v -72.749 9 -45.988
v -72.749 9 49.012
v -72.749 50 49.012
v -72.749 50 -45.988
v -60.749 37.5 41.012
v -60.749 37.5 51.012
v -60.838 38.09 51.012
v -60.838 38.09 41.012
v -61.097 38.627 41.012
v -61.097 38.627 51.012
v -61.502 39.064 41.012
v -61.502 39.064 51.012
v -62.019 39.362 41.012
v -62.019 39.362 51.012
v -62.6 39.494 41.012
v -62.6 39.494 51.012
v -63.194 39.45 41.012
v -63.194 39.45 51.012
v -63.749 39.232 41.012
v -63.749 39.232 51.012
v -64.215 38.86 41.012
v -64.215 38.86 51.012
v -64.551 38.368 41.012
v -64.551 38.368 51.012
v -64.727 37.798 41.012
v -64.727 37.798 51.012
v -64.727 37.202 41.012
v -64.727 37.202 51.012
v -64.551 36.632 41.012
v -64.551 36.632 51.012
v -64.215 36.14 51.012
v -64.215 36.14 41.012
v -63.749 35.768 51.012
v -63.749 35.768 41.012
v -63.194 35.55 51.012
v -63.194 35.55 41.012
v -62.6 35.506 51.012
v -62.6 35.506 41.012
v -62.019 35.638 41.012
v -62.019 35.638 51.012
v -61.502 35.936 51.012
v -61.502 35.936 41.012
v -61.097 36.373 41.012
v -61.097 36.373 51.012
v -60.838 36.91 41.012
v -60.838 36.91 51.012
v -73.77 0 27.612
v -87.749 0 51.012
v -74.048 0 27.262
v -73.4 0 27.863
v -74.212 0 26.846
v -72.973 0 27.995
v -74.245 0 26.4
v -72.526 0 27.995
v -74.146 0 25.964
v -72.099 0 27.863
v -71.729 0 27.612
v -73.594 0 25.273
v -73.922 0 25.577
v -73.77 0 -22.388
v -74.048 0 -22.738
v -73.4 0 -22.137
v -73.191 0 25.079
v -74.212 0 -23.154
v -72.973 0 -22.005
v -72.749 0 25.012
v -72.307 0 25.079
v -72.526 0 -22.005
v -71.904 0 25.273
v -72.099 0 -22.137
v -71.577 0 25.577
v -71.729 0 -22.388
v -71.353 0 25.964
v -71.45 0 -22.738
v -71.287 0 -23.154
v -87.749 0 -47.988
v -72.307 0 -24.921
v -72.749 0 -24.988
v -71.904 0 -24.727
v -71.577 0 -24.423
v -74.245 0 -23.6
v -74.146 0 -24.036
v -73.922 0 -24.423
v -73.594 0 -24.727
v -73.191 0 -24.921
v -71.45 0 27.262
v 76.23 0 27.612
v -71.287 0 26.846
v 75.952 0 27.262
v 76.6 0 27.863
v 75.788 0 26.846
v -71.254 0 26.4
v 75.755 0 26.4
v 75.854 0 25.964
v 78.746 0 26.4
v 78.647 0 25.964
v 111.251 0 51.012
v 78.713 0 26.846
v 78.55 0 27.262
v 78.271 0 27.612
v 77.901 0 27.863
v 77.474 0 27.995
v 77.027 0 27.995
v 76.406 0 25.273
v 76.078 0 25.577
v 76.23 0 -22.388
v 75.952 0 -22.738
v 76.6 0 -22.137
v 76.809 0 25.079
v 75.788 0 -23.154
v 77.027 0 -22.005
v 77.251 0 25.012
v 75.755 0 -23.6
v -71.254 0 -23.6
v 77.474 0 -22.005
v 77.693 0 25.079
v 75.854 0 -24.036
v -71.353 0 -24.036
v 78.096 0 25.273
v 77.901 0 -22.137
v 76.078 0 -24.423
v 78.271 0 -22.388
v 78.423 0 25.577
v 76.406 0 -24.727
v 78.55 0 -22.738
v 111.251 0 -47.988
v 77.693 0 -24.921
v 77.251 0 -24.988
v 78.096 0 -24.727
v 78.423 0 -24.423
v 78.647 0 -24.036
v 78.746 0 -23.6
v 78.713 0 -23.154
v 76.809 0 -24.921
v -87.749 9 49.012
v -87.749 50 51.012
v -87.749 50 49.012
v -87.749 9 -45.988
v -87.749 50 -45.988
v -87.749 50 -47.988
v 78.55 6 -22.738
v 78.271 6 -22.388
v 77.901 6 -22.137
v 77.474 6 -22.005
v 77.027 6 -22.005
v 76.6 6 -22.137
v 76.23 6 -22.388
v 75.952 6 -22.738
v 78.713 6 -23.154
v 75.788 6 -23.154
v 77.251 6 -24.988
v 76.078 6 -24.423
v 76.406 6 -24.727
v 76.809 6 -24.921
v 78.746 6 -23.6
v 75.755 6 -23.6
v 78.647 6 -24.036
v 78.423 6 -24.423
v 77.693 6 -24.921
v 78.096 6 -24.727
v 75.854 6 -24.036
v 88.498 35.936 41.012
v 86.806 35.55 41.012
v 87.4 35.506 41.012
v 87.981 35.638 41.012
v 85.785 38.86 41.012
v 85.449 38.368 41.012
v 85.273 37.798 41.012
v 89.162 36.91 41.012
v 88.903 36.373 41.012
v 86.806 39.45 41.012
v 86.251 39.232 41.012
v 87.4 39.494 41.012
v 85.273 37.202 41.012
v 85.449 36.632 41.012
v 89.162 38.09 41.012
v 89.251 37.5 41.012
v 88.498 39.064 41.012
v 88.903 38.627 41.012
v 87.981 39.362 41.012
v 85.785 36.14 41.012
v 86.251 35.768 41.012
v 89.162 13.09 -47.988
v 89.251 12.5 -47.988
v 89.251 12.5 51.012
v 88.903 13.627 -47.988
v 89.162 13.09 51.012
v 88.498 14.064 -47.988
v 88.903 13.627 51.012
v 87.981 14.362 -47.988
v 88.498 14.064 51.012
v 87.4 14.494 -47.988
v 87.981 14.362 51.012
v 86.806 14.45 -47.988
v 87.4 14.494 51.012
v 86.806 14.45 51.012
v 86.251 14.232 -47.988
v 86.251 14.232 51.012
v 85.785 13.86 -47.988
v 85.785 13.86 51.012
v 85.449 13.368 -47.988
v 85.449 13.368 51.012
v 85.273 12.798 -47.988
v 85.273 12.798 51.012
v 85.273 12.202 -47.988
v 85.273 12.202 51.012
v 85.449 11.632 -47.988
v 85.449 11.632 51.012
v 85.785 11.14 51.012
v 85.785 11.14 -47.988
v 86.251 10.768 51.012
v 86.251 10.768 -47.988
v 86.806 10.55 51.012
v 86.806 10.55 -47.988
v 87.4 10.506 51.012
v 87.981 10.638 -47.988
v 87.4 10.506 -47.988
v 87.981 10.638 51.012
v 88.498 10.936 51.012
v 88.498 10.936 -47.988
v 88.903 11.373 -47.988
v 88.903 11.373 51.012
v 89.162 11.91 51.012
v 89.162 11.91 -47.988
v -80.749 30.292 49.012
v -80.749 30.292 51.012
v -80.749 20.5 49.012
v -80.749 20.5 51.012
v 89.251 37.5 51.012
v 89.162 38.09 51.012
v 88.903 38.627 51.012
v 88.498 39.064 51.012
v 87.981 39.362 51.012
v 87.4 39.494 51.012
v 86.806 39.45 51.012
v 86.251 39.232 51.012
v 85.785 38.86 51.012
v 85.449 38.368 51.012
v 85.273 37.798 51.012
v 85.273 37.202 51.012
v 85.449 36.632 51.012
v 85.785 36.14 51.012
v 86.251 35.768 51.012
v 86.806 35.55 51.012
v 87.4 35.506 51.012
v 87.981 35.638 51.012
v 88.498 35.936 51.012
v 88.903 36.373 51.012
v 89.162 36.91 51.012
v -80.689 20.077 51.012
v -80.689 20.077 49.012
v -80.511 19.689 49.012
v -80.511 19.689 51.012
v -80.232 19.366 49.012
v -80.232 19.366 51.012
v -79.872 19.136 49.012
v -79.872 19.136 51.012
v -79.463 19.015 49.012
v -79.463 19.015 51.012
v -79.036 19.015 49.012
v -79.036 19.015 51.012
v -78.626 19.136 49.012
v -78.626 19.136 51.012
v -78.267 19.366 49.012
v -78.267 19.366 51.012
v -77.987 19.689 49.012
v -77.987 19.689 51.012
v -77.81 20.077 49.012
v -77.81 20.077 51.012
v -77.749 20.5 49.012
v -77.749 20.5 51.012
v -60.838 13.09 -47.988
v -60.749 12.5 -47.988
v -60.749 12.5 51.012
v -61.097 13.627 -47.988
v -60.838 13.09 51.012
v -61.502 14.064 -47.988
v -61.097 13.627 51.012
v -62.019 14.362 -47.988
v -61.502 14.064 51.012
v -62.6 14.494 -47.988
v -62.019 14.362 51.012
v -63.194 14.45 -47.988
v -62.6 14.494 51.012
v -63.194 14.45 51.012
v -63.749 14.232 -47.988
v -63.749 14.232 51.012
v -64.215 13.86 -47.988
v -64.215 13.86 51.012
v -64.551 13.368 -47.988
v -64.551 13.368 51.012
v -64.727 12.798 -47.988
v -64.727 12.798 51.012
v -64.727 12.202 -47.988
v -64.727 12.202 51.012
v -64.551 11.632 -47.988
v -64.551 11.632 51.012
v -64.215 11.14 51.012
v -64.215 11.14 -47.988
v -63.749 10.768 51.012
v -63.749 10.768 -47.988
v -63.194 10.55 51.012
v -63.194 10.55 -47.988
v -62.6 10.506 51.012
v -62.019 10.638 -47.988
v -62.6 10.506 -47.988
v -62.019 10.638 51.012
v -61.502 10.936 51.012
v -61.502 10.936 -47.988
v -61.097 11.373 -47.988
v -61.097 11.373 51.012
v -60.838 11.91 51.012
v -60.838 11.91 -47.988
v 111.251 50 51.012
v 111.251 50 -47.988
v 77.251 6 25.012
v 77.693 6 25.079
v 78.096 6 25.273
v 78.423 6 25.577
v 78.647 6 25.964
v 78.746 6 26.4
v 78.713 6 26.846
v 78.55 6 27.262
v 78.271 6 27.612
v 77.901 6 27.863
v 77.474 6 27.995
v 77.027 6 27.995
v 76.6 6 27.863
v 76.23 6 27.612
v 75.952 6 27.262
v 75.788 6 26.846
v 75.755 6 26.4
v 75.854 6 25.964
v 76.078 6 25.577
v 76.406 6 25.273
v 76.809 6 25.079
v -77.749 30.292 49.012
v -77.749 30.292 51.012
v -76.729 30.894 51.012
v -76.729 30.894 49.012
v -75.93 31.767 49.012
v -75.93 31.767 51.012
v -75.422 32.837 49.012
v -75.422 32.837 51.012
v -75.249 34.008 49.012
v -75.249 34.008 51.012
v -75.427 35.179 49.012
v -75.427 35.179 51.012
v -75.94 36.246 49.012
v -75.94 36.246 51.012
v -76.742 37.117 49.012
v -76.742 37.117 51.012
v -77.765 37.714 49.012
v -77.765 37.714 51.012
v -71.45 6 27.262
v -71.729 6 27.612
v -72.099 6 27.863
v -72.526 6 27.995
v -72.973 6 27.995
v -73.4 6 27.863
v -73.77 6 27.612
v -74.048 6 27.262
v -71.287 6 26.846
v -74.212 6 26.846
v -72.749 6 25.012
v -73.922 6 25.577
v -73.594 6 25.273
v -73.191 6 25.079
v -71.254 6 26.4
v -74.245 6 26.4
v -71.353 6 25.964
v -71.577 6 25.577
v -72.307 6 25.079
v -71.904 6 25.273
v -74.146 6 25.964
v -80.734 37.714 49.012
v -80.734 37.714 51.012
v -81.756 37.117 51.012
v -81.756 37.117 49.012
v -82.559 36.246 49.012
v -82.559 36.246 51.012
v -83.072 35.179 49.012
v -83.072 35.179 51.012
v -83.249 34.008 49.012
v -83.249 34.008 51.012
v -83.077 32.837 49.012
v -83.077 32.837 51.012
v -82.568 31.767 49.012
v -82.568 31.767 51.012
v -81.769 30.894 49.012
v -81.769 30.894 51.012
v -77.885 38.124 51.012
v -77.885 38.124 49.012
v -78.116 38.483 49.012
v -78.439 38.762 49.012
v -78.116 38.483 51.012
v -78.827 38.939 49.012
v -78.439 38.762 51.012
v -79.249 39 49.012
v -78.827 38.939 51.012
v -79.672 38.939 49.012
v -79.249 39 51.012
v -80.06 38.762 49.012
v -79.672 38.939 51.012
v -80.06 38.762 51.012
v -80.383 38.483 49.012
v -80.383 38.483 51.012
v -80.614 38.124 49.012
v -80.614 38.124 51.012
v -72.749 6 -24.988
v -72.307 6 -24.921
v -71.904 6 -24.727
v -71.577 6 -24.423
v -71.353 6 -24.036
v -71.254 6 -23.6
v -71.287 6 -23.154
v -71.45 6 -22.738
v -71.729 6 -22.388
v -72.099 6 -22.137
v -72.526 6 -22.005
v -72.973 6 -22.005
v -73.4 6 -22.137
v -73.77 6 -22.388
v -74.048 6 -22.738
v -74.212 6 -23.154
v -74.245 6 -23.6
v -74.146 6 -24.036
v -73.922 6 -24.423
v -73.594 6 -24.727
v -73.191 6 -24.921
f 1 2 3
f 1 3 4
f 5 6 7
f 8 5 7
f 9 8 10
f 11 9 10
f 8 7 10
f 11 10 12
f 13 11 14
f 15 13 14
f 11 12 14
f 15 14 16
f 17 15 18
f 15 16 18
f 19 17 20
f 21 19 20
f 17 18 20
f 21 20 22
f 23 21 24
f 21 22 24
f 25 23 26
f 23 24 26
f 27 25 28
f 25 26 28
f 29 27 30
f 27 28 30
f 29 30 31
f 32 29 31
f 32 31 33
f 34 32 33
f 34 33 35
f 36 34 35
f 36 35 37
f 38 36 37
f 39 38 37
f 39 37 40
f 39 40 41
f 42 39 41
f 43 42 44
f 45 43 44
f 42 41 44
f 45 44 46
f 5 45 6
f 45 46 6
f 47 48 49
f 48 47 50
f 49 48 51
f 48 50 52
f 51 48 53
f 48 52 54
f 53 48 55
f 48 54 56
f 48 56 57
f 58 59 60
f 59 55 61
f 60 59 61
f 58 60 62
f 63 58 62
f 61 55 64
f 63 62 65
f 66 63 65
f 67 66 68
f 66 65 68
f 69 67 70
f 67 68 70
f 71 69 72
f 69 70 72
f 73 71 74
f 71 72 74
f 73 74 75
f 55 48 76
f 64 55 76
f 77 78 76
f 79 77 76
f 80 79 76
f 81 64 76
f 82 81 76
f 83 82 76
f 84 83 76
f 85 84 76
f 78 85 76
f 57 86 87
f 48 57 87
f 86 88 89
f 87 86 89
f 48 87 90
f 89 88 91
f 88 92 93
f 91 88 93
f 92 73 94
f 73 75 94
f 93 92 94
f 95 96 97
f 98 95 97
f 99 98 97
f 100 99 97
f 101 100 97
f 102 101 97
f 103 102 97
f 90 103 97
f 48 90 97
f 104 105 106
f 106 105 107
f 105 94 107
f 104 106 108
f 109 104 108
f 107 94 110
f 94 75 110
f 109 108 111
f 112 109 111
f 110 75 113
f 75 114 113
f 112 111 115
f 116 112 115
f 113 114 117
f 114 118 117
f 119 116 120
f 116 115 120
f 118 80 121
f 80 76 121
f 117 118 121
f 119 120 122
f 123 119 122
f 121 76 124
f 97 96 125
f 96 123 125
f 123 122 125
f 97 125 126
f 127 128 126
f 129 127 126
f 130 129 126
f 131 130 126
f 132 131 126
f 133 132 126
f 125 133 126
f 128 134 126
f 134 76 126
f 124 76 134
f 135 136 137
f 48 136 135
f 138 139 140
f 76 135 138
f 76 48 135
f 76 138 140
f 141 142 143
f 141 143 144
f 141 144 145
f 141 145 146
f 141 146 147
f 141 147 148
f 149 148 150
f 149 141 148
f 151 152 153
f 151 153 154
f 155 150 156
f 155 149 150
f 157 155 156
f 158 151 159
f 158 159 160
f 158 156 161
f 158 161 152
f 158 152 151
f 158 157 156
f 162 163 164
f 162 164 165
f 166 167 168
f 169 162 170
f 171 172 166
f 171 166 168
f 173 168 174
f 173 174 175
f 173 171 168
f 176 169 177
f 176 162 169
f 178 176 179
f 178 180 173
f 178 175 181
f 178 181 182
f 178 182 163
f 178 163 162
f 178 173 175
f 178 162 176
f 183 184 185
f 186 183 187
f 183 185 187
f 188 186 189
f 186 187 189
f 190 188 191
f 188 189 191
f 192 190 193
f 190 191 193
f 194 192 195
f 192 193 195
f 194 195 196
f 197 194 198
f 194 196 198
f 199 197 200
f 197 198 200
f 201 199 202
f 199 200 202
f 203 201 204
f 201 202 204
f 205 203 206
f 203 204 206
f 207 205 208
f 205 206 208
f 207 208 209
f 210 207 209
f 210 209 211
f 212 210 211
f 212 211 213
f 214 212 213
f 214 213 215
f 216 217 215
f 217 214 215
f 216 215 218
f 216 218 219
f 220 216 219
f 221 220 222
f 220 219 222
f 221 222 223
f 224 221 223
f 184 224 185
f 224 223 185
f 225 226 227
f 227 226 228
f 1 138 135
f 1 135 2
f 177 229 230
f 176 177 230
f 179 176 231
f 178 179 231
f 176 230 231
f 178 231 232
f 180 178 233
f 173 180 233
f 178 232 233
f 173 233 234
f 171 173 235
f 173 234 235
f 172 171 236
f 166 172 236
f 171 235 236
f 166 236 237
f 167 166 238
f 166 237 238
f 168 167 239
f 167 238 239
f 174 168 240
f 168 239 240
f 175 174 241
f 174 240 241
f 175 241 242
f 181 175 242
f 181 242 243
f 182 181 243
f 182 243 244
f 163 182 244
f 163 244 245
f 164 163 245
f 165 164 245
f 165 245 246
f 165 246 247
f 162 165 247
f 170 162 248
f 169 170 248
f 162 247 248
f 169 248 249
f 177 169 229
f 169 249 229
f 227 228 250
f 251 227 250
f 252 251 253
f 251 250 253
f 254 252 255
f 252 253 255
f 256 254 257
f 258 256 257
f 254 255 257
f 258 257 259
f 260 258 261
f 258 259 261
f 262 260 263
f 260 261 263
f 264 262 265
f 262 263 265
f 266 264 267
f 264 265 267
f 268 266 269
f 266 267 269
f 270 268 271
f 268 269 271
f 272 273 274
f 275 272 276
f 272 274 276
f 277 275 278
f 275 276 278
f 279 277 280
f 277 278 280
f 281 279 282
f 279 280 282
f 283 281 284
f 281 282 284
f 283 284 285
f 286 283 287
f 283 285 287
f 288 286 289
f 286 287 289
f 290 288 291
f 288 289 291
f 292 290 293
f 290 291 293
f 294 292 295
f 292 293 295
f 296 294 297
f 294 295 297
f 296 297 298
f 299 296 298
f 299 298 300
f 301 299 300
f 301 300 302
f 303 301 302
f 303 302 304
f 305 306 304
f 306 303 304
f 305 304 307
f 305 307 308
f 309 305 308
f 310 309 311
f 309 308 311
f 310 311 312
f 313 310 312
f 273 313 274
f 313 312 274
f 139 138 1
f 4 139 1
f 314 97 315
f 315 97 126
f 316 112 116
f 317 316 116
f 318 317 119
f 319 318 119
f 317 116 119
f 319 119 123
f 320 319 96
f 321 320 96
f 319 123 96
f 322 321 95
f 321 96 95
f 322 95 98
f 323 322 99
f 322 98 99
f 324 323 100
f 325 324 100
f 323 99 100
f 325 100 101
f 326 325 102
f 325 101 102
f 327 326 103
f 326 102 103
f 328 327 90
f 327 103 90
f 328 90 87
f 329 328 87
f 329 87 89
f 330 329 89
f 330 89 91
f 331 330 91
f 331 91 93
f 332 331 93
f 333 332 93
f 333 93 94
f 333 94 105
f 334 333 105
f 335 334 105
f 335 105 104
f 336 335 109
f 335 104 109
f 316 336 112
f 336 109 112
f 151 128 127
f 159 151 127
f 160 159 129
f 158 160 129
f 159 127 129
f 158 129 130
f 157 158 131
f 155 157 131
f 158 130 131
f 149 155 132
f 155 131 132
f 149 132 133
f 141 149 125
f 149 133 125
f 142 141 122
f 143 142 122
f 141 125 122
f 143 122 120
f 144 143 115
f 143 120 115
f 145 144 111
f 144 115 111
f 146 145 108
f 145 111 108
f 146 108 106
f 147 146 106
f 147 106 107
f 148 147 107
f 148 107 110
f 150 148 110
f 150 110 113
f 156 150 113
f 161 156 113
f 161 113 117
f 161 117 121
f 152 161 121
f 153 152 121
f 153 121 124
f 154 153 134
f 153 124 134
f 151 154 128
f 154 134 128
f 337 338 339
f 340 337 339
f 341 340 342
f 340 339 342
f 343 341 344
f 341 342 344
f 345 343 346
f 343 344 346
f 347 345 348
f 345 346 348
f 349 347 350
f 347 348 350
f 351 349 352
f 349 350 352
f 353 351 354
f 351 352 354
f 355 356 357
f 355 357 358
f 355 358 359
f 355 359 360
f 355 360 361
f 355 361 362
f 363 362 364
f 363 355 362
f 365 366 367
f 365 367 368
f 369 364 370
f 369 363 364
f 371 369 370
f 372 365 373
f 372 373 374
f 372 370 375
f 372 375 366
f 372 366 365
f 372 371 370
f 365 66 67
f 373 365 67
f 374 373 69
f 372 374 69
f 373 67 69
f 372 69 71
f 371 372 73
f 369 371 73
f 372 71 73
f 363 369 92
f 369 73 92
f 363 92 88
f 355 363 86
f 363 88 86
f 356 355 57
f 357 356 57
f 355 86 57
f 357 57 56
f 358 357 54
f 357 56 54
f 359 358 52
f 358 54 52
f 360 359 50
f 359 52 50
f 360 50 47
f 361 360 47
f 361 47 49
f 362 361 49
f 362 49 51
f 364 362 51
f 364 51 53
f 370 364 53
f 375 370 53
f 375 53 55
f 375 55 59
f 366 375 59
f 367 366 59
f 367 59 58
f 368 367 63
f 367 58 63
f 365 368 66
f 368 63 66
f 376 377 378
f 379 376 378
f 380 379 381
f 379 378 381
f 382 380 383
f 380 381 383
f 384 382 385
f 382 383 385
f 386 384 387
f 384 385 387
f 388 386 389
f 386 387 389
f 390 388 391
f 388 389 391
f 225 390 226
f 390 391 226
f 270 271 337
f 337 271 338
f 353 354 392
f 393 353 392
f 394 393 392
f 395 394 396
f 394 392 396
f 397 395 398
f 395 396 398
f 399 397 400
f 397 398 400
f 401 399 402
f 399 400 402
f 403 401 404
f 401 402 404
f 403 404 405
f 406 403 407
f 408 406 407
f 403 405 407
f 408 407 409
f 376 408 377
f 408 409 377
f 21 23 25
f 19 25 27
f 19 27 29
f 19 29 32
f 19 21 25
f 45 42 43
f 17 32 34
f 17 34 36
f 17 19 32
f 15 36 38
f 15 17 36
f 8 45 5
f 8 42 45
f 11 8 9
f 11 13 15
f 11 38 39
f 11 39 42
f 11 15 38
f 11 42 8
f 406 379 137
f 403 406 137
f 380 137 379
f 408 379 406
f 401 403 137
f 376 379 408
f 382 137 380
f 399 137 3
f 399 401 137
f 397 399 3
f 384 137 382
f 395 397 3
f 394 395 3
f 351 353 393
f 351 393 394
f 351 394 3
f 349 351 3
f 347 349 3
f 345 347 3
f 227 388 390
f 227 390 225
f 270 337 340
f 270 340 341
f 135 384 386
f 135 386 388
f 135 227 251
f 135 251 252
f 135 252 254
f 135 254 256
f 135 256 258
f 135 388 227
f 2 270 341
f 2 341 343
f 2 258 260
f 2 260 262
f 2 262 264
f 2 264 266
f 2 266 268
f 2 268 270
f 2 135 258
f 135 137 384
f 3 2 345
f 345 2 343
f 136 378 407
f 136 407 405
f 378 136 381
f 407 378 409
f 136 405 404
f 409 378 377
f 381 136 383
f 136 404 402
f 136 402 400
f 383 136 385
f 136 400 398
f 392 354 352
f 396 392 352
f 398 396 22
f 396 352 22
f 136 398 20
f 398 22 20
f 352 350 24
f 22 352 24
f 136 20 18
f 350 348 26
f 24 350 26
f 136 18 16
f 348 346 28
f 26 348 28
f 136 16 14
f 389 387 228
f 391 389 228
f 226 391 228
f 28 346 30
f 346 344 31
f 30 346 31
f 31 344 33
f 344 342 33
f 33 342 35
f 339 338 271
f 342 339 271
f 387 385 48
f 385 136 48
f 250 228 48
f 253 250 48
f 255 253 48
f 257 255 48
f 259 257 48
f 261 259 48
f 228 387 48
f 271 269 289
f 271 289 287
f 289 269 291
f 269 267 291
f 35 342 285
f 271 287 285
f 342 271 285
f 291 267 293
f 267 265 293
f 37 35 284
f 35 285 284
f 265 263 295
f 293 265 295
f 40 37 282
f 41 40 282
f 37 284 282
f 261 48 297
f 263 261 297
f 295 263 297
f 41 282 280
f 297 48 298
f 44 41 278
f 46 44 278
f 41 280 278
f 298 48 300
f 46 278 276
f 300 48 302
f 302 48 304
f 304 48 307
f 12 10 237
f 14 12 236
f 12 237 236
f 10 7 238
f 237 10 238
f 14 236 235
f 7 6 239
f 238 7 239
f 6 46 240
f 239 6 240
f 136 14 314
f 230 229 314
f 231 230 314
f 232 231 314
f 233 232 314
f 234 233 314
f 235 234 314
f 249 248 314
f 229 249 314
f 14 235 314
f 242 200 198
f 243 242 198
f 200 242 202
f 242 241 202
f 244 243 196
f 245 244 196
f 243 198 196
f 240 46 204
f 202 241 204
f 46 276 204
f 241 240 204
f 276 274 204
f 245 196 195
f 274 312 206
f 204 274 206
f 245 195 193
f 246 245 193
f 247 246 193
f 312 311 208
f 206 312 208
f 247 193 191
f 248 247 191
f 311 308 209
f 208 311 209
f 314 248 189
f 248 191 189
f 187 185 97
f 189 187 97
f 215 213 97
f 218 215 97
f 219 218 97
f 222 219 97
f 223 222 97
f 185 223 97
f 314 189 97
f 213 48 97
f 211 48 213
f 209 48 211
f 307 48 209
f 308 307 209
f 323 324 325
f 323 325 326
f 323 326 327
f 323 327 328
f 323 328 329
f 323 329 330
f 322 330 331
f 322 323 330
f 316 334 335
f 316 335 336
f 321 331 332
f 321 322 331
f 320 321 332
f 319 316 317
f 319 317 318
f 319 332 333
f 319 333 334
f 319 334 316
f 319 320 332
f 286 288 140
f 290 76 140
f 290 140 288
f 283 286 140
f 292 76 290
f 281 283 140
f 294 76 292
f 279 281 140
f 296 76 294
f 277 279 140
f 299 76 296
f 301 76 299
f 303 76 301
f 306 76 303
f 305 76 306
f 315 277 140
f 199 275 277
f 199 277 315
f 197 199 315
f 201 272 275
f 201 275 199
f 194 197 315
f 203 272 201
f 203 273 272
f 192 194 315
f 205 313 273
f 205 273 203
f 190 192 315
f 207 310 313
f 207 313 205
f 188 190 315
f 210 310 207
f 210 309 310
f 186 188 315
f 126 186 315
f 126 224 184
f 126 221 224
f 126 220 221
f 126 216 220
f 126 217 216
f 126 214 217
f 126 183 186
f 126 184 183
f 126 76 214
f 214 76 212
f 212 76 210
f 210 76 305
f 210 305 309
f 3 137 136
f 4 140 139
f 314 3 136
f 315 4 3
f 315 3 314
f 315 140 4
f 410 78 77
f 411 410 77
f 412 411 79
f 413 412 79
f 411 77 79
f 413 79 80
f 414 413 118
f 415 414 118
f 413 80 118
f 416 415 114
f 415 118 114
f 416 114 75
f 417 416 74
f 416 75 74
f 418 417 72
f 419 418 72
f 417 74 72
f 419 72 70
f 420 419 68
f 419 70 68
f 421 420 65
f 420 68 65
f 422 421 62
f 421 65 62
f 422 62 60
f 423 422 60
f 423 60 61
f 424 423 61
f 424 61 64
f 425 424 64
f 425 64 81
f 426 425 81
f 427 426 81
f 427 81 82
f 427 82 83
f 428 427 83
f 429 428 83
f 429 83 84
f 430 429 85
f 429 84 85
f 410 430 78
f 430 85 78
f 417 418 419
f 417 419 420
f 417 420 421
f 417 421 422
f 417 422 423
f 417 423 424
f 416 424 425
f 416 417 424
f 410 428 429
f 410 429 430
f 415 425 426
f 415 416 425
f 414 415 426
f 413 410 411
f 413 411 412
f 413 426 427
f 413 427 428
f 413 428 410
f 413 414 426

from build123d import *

# Parameters (mm, degrees)
SKETCH_1_W          = 199
SKETCH_1_H          = 99
EXTRUDE_1_DEPTH     = 9
SKETCH_2_W          = 199
SKETCH_2_H          = 2
EXTRUDE_2_DEPTH     = 41
SKETCH_4_W          = 199
SKETCH_4_H          = 2
EXTRUDE_3_DEPTH     = 41
SKETCH_5_W          = 184
SKETCH_5_H          = 95
EXTRUDE_4_DEPTH     = 41
SKETCH_6_R          = 2
CUT_EXTRUDE_2_DEPTH = 10
CUT_EXTRUDE_3_DEPTH = 10
SKETCH_10_R         = 2
CUT_EXTRUDE_4_DEPTH = 158.091394395
SKETCH_11_R         = 1.5
CUT_EXTRUDE_5_DEPTH = 6


with BuildPart() as part:
    # 草图1 → 凸台-拉伸1 (new body)
    with BuildSketch(Plane(origin=(0, 0, 0), x_dir=(1, 0, 0), z_dir=(0, 1, 0))):
        with Locations((11.750645809, -1.511939619)):
            Rectangle(SKETCH_1_W, SKETCH_1_H)
    extrude(amount=EXTRUDE_1_DEPTH)

    # 草图2 → 凸台-拉伸2 (add)
    with BuildSketch(Plane(origin=(0, 9, 0), x_dir=(1, 0, 0), z_dir=(0, 1, 0))):
        with Locations((11.750645809, -50.011939619)):
            Rectangle(SKETCH_2_W, SKETCH_2_H)
    extrude(amount=EXTRUDE_2_DEPTH)

    # 草图4 → 凸台-拉伸3 (add)
    with BuildSketch(Plane(origin=(0, 9, 0), x_dir=(1, 0, 0), z_dir=(0, 1, 0))):
        with Locations((11.750645809, 46.988060381)):
            Rectangle(SKETCH_4_W, SKETCH_4_H)
    extrude(amount=EXTRUDE_3_DEPTH)

    # 草图5 → 凸台-拉伸4 (add)
    with BuildSketch(Plane(origin=(0, 9, 0), x_dir=(1, 0, 0), z_dir=(0, 1, 0))):
        with Locations((19.250645809, -1.511939619)):
            Rectangle(SKETCH_5_W, SKETCH_5_H)
    extrude(amount=EXTRUDE_4_DEPTH)

    # 草图6 → 切除-拉伸2 (cut)
    with BuildSketch(Plane.XY.offset(51.011939619)):
        with Locations((87.250645809, 37.5)):
            Circle(SKETCH_6_R)
        with Locations((87.250645809, 12.5)):
            Circle(SKETCH_6_R)
        with Locations((-62.749354191, 12.5)):
            Circle(SKETCH_6_R)
        with Locations((-62.749354191, 37.5)):
            Circle(SKETCH_6_R)
    extrude(amount=-CUT_EXTRUDE_2_DEPTH, mode=Mode.SUBTRACT)

    # 草图8 → 切除-拉伸3 (cut)
    with BuildSketch(Plane.XY.offset(51.011939619)):
        with BuildLine():
            ThreePointArc((-77.764739213, 37.714285714), (-79.249354191, 39), (-80.733969169, 37.714285714))
            ThreePointArc((-80.733969169, 37.714285714), (-83.249345598, 34.00829113), (-80.749354191, 30.291900756))
            Line((-80.749354191, 30.291900756), (-80.749354191, 20.5))
            ThreePointArc((-80.749354191, 20.5), (-79.249354191, 19), (-77.749354191, 20.5))
            Line((-77.749354191, 20.5), (-77.749354191, 30.291900756))
            ThreePointArc((-77.749354191, 30.291900756), (-75.249362784, 34.00829113), (-77.764739213, 37.714285714))
        make_face()
    extrude(amount=-CUT_EXTRUDE_3_DEPTH, mode=Mode.SUBTRACT)

    # 草图10 → 切除-拉伸4 (cut, through all)
    with BuildSketch(Plane(origin=(0, 0, -47.988060381), x_dir=(-1, 0, 0), z_dir=(0, 0, -1))):
        with Locations(Location((62.749354191, 12.5, 0), (0, 0, 180))):
            Circle(SKETCH_10_R)
        with Locations(Location((-87.250645809, 12.5, 0), (0, 0, 180))):
            Circle(SKETCH_10_R)
    extrude(amount=-CUT_EXTRUDE_4_DEPTH, mode=Mode.SUBTRACT)

    # 草图11 → 切除-拉伸5 (cut)
    with BuildSketch(Plane(origin=(0, 0, 0), x_dir=(-1, 0, 0), z_dir=(0, -1, 0))):
        with Locations(Location((72.749354191, 23.488060381, 0), (0, 0, 90))):
            Circle(SKETCH_11_R)
        with Locations(Location((72.749354191, -26.511939619, 0), (0, 0, 90))):
            Circle(SKETCH_11_R)
        with Locations(Location((-77.250645809, 23.488060381, 0), (0, 0, 90))):
            Circle(SKETCH_11_R)
        with Locations(Location((-77.250645809, -26.511939619, 0), (0, 0, 90))):
            Circle(SKETCH_11_R)
    extrude(amount=-CUT_EXTRUDE_5_DEPTH, mode=Mode.SUBTRACT)


solid = part.part
